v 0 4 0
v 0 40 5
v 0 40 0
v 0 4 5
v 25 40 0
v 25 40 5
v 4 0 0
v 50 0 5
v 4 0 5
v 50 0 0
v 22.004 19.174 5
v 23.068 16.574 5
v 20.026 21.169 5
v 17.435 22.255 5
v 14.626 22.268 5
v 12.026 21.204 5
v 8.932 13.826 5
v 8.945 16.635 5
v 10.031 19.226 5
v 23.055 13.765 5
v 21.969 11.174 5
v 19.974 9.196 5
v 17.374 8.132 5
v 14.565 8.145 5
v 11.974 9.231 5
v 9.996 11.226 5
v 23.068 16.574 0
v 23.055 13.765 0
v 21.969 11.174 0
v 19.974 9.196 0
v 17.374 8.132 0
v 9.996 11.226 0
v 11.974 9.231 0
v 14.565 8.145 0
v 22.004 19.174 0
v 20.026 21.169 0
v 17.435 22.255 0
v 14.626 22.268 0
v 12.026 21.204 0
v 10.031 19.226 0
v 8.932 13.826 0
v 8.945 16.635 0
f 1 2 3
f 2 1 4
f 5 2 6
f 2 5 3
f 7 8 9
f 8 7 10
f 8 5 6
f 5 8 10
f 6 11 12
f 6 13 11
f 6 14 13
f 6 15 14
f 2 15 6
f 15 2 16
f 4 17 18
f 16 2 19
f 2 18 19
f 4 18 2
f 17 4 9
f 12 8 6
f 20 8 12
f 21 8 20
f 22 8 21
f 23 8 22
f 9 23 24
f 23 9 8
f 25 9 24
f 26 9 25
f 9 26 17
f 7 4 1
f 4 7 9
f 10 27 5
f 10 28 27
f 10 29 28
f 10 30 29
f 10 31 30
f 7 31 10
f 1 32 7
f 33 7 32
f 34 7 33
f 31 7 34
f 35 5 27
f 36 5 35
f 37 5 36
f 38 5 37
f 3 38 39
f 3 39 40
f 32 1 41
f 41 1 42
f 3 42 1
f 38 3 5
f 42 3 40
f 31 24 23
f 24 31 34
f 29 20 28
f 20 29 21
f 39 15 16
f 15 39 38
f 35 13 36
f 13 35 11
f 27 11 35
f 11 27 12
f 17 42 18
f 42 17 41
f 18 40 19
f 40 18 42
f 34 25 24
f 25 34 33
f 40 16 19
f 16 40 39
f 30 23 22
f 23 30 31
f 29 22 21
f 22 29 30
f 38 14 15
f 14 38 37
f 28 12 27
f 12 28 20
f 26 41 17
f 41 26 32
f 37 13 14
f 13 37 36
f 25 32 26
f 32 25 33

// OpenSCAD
$fn = 32;

// ----------------------------------------------------------------------
// Bracket plate: gusset 50 x 40
// ----------------------------------------------------------------------

// --- parameters (mm) ---
hole_r = 3.5;             // bolt hole radius
plate_t = 5;              // plate thickness, Z (extrusion height)
gus_a = 50;               // base length
gus_b = 40;               // height
top_x = 25;               // top edge X of the angled cut
light_r = 7.2;            // lightening hole radius

light_d = 2 * light_r;

profile = [[4, 0], [25, 0], [50, 0], [25, 40], [0, 40], [0, 4]];  // primary outline, 6 points, counter clockwise
void_1 = [[23.068, 16.574], [22.004, 19.174], [20.026, 21.169], [17.435, 22.255], [14.626, 22.268], [12.026, 21.204], [10.031, 19.226], [8.945, 16.635], [8.932, 13.826], [9.996, 11.226], [11.974, 9.231], [14.565, 8.145], [17.374, 8.132], [19.974, 9.196], [21.969, 11.174], [23.055, 13.765]];  // lightening hole, 16 points

// --- the one profile operation ---
difference() {
  linear_extrude(height = plate_t) polygon(points = profile);
  translate([0, 0, -1])
    linear_extrude(height = plate_t + 2) polygon(points = void_1);
}
